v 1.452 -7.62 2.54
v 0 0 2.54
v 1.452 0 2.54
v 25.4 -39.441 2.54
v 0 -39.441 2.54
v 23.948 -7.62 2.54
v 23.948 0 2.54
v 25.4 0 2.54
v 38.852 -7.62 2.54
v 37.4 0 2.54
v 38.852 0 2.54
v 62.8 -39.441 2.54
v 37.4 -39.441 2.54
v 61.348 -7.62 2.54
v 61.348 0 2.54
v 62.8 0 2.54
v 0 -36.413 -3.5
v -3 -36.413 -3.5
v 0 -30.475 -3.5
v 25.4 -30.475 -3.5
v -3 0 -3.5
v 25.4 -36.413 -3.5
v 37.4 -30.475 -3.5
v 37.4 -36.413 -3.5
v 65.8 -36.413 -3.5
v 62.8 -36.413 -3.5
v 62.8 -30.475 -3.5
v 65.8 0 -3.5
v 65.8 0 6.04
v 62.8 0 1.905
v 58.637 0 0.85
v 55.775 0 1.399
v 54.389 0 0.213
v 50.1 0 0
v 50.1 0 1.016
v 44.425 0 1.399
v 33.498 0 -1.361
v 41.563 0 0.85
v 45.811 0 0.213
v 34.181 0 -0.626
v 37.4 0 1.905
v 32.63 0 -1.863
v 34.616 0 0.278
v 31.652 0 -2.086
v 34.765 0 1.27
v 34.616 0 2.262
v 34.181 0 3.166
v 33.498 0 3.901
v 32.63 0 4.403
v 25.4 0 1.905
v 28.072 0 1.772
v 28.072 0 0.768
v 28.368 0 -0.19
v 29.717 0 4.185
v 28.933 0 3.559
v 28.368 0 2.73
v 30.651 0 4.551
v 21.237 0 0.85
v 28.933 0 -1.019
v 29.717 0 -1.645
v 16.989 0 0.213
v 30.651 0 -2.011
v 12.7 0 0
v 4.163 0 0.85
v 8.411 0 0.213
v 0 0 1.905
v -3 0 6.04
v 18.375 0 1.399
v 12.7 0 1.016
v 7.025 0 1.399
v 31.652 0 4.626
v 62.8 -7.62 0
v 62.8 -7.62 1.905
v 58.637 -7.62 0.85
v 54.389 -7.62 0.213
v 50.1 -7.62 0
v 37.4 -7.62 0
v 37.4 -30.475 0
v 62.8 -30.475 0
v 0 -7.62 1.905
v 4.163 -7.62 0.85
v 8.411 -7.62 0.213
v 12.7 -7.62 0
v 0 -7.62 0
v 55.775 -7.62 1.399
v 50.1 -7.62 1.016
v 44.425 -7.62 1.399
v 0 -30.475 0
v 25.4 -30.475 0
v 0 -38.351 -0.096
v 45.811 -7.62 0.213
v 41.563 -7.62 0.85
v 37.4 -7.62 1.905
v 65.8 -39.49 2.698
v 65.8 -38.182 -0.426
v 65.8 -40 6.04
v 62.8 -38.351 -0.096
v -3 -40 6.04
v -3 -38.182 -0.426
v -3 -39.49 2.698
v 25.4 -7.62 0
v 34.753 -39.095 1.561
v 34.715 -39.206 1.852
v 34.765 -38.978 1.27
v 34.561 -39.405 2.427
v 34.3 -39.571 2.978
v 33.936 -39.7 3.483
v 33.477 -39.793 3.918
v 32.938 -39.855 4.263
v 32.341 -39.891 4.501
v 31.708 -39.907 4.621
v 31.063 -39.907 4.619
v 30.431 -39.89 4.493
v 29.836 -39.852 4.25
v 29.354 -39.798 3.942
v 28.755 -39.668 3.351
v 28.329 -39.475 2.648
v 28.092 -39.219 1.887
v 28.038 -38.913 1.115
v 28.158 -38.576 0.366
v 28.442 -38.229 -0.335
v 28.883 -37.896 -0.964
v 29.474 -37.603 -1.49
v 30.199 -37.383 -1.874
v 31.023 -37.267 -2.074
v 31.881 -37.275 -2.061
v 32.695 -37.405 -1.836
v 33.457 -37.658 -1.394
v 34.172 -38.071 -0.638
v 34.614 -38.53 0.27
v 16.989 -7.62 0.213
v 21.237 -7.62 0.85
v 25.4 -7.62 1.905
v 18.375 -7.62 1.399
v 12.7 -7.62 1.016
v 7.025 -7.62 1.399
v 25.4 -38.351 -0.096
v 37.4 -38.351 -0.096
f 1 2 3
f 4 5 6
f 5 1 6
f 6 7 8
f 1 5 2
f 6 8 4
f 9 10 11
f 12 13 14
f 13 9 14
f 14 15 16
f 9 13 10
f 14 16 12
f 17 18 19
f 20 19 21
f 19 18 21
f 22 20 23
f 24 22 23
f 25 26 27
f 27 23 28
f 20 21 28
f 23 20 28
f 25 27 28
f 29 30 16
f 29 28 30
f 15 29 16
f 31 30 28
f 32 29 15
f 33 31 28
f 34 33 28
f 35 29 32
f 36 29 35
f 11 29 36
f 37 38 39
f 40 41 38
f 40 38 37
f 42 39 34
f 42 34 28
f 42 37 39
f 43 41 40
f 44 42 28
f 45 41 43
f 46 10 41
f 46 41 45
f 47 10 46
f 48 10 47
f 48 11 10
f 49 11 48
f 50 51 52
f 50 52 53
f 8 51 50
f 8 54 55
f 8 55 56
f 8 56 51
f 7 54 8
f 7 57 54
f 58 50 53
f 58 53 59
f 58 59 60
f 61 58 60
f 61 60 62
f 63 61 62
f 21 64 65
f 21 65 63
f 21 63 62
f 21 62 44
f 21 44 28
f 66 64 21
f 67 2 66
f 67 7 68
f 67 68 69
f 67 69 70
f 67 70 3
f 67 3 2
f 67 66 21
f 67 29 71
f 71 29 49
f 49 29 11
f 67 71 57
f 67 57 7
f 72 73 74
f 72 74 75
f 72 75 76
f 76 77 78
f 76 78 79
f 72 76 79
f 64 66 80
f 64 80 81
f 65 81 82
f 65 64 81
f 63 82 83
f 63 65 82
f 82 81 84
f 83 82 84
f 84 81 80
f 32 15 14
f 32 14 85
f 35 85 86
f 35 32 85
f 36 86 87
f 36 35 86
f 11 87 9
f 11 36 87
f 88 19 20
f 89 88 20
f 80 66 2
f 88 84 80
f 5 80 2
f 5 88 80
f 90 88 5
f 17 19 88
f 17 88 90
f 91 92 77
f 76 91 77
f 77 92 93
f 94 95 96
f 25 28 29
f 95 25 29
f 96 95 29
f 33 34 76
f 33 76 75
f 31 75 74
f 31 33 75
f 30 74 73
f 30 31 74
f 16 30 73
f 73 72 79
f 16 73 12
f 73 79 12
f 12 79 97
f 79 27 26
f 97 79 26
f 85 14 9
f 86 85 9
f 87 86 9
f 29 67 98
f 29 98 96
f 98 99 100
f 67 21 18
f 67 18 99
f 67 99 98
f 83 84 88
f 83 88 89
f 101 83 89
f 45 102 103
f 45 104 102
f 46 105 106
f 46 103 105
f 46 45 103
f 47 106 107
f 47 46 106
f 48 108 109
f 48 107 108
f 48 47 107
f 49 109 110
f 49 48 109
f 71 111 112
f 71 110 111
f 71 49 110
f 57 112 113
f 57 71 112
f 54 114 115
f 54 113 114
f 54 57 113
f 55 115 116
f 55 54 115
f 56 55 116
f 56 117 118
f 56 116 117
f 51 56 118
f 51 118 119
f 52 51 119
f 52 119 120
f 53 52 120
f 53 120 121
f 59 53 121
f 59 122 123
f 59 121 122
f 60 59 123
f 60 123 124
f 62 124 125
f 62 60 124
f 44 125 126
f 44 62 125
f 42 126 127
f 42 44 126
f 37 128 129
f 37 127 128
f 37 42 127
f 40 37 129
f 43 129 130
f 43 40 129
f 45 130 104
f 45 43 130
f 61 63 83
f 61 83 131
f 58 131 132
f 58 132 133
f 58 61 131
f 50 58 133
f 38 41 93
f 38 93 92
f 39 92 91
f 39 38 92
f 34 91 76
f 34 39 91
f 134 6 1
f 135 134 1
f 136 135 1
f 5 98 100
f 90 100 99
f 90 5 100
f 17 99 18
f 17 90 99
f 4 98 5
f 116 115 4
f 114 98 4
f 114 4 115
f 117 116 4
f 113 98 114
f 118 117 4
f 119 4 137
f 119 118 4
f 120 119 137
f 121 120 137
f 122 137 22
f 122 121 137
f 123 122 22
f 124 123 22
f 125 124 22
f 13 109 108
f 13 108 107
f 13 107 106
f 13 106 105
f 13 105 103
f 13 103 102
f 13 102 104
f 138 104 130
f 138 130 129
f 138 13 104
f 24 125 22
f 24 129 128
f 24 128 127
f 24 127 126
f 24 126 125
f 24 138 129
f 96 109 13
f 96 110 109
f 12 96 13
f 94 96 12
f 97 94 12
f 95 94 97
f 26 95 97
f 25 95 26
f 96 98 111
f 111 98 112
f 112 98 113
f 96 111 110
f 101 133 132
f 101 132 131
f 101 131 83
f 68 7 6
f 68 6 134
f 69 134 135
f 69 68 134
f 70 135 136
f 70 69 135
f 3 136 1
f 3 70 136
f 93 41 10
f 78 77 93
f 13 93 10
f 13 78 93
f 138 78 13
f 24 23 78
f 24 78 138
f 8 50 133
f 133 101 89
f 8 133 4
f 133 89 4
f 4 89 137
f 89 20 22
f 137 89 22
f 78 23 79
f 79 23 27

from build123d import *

# Parameters (mm, degrees)
F0_W     = 68.8
F0_H     = 9.54
F0_W_2   = 25.4
F0_H_2   = 2.54
F0_R     = 3.3655
F1_DEPTH = 40
F2_W     = 25.4
F2_H     = 9.525
F3_DEPTH = 3.5
F6_DEPTH = 68.8
F8_DEPTH = 7.62


with BuildPart() as f1:
    # F0 (on Front) → F1 (new body)
    with BuildSketch(Plane.XZ):
        with Locations((31.4, 1.27)):
            Rectangle(F0_W, F0_H)
        with Locations((12.7, 1.27)):
            Rectangle(F0_W_2, F0_H_2, mode=Mode.SUBTRACT)
        with Locations((31.4, 1.27)):
            Circle(F0_R, mode=Mode.SUBTRACT)
        with Locations((50.1, 1.27)):
            Rectangle(F0_W_2, F0_H_2, mode=Mode.SUBTRACT)
    extrude(amount=F1_DEPTH)

    # F2 (on face) → F3 (cut, through all)
    with BuildSketch(Plane(origin=(0, 0, -3.5), x_dir=(1, 0, 0), z_dir=(0, 0, -1))):
        with Locations((12.7, 35.2375)):
            Rectangle(F2_W, F2_H)
        with Locations((50.1, 35.2375)):
            Rectangle(F2_W, F2_H)
    extrude(amount=-F3_DEPTH, mode=Mode.SUBTRACT)

    # F5 (on face) → F6 (cut, through all)
    with BuildSketch(Plane.YZ.offset(65.8)):
        with BuildLine():
            Line((-40, -3.5), (-36.412868955, -3.5))
            add(Edge.make_bspline(
                [(-40, 6.04), (-40, 2.5308377617), (-38.3018730084, -0.3928871964), (-36.412868955, -3.5)],
                knots=[0, 0, 0, 0, 10.1921101414, 10.1921101414, 10.1921101414, 10.1921101414], degree=3))
            Line((-40, 6.04), (-40, -3.5))
        make_face()
    extrude(amount=-F6_DEPTH, mode=Mode.SUBTRACT)

    # F7 (on face) → F8 (join)
    with BuildSketch(Plane(origin=(0, 0, 0), x_dir=(-1, 0, 0), z_dir=(0, 1, 0))):
        with BuildLine():
            ThreePointArc((-37.4, 1.905), (-43.6789598779, 0.4788991858), (-50.1, 0))
            Line((-50.1, 0), (-37.4, 0))
            Line((-37.4, 0), (-37.4, 1.905))
        make_face()
        with BuildLine():
            ThreePointArc((-50.1, 0), (-56.5210401221, 0.4788991858), (-62.8, 1.905))
            Line((-62.8, 1.905), (-62.8, 0))
            Line((-62.8, 0), (-50.1, 0))
        make_face()
        with BuildLine():
            Line((-38.8520723687, 2.54), (-61.3479276313, 2.54))
            ThreePointArc((-61.3479276313, 2.54), (-50.1, 1.016), (-38.8520723687, 2.54))
        make_face()
        with BuildLine():
            ThreePointArc((0, 1.905), (-6.2789599942, 0.4788991684), (-12.7000002352, 0))
            Line((-12.7000002352, 0), (0, 0))
            Line((0, 0), (0, 1.905))
        make_face()
        with BuildLine():
            Line((-25.4, 1.905), (-25.4, 0))
            Line((-25.4, 0), (-12.7000002352, 0))
            ThreePointArc((-12.7000002352, 0), (-19.1210402384, 0.4788992032), (-25.4, 1.905))
        make_face()
        with BuildLine():
            ThreePointArc((-23.9479276313, 2.54), (-12.7, 1.016), (-1.4520723687, 2.54))
            Line((-1.4520723687, 2.54), (-23.9479276313, 2.54))
        make_face()
    extrude(amount=-F8_DEPTH)


solid = f1.part
